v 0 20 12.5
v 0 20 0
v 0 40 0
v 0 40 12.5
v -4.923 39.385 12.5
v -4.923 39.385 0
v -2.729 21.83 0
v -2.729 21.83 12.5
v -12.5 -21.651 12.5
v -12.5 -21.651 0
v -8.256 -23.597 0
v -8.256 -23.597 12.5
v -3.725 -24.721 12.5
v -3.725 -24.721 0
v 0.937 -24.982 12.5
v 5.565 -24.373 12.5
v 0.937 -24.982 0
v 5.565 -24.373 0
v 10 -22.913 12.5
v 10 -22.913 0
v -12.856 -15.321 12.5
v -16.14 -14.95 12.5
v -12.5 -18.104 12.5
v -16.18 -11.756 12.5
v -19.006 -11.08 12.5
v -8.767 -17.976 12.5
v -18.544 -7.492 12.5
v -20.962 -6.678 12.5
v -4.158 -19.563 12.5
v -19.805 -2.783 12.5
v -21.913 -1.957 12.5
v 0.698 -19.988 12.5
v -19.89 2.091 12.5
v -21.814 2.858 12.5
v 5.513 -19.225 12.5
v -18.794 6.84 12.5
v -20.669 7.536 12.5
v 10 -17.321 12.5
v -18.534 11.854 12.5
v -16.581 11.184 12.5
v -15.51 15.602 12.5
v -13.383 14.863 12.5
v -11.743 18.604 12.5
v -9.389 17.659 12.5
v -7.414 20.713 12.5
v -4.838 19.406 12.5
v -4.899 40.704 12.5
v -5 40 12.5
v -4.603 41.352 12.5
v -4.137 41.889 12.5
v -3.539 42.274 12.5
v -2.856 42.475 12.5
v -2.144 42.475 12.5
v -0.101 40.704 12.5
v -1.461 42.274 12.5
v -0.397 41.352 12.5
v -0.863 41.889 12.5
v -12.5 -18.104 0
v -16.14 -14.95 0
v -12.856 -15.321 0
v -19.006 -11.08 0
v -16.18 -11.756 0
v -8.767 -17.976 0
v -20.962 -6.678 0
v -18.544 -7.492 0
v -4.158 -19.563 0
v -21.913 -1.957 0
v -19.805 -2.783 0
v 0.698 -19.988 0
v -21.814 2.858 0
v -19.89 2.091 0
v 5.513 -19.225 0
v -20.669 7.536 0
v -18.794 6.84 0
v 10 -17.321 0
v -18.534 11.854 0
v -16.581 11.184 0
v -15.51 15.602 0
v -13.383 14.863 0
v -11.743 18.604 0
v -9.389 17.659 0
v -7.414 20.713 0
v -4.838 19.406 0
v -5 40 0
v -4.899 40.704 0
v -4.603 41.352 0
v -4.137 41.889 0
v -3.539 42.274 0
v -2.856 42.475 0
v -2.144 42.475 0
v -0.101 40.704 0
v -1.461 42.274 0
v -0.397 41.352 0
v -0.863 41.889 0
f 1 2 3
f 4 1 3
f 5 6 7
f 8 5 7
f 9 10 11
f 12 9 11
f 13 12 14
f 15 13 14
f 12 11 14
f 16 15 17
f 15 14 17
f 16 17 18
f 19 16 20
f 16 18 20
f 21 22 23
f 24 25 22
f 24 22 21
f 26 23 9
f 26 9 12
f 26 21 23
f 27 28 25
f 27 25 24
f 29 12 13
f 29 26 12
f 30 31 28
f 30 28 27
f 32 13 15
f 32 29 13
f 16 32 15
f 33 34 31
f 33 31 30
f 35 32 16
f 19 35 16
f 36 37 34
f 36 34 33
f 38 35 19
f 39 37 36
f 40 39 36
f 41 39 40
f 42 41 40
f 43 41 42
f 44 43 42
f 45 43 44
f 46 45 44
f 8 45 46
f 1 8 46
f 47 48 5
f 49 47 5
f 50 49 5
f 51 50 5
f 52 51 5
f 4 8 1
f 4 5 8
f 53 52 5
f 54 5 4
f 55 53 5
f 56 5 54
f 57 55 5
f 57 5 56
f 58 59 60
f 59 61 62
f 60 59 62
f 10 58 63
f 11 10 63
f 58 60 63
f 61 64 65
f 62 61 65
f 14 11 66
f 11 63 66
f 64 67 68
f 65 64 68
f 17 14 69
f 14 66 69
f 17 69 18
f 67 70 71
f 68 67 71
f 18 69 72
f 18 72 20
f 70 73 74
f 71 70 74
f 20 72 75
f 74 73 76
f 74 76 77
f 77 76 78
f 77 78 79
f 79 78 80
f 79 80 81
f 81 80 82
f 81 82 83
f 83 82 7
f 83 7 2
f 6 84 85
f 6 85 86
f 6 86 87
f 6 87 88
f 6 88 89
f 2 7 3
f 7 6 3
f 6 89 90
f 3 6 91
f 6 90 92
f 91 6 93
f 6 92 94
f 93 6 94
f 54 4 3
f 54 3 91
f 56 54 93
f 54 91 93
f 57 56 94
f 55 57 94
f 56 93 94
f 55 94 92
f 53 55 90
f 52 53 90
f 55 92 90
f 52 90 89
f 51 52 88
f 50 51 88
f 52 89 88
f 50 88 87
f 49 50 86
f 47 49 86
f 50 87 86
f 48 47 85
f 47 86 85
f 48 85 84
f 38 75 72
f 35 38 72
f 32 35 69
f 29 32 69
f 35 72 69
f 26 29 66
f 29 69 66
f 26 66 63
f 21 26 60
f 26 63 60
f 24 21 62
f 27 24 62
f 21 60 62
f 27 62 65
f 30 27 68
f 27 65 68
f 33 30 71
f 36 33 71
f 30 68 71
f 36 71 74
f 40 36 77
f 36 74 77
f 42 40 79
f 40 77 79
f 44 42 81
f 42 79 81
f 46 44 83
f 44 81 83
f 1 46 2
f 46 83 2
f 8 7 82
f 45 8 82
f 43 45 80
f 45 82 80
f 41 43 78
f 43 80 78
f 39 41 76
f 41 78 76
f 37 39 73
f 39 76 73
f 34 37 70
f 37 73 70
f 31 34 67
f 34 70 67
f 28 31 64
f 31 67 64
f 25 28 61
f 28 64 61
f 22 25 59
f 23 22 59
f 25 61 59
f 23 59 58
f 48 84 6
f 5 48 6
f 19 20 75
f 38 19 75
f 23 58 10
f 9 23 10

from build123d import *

# Parameters (mm, degrees)
RESSALTO_EXTRUS_O1_DEPTH = 12.5


with BuildPart() as part:
    # Esboço1 → Ressalto-extrusão1 (new body)
    with BuildSketch(Plane.XY):
        with BuildLine():
            Line((10, -22.912878475), (10, -17.320508076))
            ThreePointArc((10, -17.320508076), (-19.318516526, -5.176380902), (0, 20))
            Line((0, 20), (0, 40))
            ThreePointArc((0, 40), (-2.5, 42.5), (-5, 40))
            Line((-5, 40), (-4.923076923, 39.384615385))
            Line((-4.923076923, 39.384615385), (-2.728764161, 21.830113288))
            ThreePointArc((-2.728764161, 21.830113288), (-21.36959311, 5.228813472), (-12.5, -18.10386699))
            Line((-12.5, -18.10386699), (-12.5, -21.650635095))
            ThreePointArc((-12.5, -21.650635095), (-1.400290894, -24.960752902), (10, -22.912878475))
        make_face()
    extrude(amount=RESSALTO_EXTRUS_O1_DEPTH)


solid = part.part
